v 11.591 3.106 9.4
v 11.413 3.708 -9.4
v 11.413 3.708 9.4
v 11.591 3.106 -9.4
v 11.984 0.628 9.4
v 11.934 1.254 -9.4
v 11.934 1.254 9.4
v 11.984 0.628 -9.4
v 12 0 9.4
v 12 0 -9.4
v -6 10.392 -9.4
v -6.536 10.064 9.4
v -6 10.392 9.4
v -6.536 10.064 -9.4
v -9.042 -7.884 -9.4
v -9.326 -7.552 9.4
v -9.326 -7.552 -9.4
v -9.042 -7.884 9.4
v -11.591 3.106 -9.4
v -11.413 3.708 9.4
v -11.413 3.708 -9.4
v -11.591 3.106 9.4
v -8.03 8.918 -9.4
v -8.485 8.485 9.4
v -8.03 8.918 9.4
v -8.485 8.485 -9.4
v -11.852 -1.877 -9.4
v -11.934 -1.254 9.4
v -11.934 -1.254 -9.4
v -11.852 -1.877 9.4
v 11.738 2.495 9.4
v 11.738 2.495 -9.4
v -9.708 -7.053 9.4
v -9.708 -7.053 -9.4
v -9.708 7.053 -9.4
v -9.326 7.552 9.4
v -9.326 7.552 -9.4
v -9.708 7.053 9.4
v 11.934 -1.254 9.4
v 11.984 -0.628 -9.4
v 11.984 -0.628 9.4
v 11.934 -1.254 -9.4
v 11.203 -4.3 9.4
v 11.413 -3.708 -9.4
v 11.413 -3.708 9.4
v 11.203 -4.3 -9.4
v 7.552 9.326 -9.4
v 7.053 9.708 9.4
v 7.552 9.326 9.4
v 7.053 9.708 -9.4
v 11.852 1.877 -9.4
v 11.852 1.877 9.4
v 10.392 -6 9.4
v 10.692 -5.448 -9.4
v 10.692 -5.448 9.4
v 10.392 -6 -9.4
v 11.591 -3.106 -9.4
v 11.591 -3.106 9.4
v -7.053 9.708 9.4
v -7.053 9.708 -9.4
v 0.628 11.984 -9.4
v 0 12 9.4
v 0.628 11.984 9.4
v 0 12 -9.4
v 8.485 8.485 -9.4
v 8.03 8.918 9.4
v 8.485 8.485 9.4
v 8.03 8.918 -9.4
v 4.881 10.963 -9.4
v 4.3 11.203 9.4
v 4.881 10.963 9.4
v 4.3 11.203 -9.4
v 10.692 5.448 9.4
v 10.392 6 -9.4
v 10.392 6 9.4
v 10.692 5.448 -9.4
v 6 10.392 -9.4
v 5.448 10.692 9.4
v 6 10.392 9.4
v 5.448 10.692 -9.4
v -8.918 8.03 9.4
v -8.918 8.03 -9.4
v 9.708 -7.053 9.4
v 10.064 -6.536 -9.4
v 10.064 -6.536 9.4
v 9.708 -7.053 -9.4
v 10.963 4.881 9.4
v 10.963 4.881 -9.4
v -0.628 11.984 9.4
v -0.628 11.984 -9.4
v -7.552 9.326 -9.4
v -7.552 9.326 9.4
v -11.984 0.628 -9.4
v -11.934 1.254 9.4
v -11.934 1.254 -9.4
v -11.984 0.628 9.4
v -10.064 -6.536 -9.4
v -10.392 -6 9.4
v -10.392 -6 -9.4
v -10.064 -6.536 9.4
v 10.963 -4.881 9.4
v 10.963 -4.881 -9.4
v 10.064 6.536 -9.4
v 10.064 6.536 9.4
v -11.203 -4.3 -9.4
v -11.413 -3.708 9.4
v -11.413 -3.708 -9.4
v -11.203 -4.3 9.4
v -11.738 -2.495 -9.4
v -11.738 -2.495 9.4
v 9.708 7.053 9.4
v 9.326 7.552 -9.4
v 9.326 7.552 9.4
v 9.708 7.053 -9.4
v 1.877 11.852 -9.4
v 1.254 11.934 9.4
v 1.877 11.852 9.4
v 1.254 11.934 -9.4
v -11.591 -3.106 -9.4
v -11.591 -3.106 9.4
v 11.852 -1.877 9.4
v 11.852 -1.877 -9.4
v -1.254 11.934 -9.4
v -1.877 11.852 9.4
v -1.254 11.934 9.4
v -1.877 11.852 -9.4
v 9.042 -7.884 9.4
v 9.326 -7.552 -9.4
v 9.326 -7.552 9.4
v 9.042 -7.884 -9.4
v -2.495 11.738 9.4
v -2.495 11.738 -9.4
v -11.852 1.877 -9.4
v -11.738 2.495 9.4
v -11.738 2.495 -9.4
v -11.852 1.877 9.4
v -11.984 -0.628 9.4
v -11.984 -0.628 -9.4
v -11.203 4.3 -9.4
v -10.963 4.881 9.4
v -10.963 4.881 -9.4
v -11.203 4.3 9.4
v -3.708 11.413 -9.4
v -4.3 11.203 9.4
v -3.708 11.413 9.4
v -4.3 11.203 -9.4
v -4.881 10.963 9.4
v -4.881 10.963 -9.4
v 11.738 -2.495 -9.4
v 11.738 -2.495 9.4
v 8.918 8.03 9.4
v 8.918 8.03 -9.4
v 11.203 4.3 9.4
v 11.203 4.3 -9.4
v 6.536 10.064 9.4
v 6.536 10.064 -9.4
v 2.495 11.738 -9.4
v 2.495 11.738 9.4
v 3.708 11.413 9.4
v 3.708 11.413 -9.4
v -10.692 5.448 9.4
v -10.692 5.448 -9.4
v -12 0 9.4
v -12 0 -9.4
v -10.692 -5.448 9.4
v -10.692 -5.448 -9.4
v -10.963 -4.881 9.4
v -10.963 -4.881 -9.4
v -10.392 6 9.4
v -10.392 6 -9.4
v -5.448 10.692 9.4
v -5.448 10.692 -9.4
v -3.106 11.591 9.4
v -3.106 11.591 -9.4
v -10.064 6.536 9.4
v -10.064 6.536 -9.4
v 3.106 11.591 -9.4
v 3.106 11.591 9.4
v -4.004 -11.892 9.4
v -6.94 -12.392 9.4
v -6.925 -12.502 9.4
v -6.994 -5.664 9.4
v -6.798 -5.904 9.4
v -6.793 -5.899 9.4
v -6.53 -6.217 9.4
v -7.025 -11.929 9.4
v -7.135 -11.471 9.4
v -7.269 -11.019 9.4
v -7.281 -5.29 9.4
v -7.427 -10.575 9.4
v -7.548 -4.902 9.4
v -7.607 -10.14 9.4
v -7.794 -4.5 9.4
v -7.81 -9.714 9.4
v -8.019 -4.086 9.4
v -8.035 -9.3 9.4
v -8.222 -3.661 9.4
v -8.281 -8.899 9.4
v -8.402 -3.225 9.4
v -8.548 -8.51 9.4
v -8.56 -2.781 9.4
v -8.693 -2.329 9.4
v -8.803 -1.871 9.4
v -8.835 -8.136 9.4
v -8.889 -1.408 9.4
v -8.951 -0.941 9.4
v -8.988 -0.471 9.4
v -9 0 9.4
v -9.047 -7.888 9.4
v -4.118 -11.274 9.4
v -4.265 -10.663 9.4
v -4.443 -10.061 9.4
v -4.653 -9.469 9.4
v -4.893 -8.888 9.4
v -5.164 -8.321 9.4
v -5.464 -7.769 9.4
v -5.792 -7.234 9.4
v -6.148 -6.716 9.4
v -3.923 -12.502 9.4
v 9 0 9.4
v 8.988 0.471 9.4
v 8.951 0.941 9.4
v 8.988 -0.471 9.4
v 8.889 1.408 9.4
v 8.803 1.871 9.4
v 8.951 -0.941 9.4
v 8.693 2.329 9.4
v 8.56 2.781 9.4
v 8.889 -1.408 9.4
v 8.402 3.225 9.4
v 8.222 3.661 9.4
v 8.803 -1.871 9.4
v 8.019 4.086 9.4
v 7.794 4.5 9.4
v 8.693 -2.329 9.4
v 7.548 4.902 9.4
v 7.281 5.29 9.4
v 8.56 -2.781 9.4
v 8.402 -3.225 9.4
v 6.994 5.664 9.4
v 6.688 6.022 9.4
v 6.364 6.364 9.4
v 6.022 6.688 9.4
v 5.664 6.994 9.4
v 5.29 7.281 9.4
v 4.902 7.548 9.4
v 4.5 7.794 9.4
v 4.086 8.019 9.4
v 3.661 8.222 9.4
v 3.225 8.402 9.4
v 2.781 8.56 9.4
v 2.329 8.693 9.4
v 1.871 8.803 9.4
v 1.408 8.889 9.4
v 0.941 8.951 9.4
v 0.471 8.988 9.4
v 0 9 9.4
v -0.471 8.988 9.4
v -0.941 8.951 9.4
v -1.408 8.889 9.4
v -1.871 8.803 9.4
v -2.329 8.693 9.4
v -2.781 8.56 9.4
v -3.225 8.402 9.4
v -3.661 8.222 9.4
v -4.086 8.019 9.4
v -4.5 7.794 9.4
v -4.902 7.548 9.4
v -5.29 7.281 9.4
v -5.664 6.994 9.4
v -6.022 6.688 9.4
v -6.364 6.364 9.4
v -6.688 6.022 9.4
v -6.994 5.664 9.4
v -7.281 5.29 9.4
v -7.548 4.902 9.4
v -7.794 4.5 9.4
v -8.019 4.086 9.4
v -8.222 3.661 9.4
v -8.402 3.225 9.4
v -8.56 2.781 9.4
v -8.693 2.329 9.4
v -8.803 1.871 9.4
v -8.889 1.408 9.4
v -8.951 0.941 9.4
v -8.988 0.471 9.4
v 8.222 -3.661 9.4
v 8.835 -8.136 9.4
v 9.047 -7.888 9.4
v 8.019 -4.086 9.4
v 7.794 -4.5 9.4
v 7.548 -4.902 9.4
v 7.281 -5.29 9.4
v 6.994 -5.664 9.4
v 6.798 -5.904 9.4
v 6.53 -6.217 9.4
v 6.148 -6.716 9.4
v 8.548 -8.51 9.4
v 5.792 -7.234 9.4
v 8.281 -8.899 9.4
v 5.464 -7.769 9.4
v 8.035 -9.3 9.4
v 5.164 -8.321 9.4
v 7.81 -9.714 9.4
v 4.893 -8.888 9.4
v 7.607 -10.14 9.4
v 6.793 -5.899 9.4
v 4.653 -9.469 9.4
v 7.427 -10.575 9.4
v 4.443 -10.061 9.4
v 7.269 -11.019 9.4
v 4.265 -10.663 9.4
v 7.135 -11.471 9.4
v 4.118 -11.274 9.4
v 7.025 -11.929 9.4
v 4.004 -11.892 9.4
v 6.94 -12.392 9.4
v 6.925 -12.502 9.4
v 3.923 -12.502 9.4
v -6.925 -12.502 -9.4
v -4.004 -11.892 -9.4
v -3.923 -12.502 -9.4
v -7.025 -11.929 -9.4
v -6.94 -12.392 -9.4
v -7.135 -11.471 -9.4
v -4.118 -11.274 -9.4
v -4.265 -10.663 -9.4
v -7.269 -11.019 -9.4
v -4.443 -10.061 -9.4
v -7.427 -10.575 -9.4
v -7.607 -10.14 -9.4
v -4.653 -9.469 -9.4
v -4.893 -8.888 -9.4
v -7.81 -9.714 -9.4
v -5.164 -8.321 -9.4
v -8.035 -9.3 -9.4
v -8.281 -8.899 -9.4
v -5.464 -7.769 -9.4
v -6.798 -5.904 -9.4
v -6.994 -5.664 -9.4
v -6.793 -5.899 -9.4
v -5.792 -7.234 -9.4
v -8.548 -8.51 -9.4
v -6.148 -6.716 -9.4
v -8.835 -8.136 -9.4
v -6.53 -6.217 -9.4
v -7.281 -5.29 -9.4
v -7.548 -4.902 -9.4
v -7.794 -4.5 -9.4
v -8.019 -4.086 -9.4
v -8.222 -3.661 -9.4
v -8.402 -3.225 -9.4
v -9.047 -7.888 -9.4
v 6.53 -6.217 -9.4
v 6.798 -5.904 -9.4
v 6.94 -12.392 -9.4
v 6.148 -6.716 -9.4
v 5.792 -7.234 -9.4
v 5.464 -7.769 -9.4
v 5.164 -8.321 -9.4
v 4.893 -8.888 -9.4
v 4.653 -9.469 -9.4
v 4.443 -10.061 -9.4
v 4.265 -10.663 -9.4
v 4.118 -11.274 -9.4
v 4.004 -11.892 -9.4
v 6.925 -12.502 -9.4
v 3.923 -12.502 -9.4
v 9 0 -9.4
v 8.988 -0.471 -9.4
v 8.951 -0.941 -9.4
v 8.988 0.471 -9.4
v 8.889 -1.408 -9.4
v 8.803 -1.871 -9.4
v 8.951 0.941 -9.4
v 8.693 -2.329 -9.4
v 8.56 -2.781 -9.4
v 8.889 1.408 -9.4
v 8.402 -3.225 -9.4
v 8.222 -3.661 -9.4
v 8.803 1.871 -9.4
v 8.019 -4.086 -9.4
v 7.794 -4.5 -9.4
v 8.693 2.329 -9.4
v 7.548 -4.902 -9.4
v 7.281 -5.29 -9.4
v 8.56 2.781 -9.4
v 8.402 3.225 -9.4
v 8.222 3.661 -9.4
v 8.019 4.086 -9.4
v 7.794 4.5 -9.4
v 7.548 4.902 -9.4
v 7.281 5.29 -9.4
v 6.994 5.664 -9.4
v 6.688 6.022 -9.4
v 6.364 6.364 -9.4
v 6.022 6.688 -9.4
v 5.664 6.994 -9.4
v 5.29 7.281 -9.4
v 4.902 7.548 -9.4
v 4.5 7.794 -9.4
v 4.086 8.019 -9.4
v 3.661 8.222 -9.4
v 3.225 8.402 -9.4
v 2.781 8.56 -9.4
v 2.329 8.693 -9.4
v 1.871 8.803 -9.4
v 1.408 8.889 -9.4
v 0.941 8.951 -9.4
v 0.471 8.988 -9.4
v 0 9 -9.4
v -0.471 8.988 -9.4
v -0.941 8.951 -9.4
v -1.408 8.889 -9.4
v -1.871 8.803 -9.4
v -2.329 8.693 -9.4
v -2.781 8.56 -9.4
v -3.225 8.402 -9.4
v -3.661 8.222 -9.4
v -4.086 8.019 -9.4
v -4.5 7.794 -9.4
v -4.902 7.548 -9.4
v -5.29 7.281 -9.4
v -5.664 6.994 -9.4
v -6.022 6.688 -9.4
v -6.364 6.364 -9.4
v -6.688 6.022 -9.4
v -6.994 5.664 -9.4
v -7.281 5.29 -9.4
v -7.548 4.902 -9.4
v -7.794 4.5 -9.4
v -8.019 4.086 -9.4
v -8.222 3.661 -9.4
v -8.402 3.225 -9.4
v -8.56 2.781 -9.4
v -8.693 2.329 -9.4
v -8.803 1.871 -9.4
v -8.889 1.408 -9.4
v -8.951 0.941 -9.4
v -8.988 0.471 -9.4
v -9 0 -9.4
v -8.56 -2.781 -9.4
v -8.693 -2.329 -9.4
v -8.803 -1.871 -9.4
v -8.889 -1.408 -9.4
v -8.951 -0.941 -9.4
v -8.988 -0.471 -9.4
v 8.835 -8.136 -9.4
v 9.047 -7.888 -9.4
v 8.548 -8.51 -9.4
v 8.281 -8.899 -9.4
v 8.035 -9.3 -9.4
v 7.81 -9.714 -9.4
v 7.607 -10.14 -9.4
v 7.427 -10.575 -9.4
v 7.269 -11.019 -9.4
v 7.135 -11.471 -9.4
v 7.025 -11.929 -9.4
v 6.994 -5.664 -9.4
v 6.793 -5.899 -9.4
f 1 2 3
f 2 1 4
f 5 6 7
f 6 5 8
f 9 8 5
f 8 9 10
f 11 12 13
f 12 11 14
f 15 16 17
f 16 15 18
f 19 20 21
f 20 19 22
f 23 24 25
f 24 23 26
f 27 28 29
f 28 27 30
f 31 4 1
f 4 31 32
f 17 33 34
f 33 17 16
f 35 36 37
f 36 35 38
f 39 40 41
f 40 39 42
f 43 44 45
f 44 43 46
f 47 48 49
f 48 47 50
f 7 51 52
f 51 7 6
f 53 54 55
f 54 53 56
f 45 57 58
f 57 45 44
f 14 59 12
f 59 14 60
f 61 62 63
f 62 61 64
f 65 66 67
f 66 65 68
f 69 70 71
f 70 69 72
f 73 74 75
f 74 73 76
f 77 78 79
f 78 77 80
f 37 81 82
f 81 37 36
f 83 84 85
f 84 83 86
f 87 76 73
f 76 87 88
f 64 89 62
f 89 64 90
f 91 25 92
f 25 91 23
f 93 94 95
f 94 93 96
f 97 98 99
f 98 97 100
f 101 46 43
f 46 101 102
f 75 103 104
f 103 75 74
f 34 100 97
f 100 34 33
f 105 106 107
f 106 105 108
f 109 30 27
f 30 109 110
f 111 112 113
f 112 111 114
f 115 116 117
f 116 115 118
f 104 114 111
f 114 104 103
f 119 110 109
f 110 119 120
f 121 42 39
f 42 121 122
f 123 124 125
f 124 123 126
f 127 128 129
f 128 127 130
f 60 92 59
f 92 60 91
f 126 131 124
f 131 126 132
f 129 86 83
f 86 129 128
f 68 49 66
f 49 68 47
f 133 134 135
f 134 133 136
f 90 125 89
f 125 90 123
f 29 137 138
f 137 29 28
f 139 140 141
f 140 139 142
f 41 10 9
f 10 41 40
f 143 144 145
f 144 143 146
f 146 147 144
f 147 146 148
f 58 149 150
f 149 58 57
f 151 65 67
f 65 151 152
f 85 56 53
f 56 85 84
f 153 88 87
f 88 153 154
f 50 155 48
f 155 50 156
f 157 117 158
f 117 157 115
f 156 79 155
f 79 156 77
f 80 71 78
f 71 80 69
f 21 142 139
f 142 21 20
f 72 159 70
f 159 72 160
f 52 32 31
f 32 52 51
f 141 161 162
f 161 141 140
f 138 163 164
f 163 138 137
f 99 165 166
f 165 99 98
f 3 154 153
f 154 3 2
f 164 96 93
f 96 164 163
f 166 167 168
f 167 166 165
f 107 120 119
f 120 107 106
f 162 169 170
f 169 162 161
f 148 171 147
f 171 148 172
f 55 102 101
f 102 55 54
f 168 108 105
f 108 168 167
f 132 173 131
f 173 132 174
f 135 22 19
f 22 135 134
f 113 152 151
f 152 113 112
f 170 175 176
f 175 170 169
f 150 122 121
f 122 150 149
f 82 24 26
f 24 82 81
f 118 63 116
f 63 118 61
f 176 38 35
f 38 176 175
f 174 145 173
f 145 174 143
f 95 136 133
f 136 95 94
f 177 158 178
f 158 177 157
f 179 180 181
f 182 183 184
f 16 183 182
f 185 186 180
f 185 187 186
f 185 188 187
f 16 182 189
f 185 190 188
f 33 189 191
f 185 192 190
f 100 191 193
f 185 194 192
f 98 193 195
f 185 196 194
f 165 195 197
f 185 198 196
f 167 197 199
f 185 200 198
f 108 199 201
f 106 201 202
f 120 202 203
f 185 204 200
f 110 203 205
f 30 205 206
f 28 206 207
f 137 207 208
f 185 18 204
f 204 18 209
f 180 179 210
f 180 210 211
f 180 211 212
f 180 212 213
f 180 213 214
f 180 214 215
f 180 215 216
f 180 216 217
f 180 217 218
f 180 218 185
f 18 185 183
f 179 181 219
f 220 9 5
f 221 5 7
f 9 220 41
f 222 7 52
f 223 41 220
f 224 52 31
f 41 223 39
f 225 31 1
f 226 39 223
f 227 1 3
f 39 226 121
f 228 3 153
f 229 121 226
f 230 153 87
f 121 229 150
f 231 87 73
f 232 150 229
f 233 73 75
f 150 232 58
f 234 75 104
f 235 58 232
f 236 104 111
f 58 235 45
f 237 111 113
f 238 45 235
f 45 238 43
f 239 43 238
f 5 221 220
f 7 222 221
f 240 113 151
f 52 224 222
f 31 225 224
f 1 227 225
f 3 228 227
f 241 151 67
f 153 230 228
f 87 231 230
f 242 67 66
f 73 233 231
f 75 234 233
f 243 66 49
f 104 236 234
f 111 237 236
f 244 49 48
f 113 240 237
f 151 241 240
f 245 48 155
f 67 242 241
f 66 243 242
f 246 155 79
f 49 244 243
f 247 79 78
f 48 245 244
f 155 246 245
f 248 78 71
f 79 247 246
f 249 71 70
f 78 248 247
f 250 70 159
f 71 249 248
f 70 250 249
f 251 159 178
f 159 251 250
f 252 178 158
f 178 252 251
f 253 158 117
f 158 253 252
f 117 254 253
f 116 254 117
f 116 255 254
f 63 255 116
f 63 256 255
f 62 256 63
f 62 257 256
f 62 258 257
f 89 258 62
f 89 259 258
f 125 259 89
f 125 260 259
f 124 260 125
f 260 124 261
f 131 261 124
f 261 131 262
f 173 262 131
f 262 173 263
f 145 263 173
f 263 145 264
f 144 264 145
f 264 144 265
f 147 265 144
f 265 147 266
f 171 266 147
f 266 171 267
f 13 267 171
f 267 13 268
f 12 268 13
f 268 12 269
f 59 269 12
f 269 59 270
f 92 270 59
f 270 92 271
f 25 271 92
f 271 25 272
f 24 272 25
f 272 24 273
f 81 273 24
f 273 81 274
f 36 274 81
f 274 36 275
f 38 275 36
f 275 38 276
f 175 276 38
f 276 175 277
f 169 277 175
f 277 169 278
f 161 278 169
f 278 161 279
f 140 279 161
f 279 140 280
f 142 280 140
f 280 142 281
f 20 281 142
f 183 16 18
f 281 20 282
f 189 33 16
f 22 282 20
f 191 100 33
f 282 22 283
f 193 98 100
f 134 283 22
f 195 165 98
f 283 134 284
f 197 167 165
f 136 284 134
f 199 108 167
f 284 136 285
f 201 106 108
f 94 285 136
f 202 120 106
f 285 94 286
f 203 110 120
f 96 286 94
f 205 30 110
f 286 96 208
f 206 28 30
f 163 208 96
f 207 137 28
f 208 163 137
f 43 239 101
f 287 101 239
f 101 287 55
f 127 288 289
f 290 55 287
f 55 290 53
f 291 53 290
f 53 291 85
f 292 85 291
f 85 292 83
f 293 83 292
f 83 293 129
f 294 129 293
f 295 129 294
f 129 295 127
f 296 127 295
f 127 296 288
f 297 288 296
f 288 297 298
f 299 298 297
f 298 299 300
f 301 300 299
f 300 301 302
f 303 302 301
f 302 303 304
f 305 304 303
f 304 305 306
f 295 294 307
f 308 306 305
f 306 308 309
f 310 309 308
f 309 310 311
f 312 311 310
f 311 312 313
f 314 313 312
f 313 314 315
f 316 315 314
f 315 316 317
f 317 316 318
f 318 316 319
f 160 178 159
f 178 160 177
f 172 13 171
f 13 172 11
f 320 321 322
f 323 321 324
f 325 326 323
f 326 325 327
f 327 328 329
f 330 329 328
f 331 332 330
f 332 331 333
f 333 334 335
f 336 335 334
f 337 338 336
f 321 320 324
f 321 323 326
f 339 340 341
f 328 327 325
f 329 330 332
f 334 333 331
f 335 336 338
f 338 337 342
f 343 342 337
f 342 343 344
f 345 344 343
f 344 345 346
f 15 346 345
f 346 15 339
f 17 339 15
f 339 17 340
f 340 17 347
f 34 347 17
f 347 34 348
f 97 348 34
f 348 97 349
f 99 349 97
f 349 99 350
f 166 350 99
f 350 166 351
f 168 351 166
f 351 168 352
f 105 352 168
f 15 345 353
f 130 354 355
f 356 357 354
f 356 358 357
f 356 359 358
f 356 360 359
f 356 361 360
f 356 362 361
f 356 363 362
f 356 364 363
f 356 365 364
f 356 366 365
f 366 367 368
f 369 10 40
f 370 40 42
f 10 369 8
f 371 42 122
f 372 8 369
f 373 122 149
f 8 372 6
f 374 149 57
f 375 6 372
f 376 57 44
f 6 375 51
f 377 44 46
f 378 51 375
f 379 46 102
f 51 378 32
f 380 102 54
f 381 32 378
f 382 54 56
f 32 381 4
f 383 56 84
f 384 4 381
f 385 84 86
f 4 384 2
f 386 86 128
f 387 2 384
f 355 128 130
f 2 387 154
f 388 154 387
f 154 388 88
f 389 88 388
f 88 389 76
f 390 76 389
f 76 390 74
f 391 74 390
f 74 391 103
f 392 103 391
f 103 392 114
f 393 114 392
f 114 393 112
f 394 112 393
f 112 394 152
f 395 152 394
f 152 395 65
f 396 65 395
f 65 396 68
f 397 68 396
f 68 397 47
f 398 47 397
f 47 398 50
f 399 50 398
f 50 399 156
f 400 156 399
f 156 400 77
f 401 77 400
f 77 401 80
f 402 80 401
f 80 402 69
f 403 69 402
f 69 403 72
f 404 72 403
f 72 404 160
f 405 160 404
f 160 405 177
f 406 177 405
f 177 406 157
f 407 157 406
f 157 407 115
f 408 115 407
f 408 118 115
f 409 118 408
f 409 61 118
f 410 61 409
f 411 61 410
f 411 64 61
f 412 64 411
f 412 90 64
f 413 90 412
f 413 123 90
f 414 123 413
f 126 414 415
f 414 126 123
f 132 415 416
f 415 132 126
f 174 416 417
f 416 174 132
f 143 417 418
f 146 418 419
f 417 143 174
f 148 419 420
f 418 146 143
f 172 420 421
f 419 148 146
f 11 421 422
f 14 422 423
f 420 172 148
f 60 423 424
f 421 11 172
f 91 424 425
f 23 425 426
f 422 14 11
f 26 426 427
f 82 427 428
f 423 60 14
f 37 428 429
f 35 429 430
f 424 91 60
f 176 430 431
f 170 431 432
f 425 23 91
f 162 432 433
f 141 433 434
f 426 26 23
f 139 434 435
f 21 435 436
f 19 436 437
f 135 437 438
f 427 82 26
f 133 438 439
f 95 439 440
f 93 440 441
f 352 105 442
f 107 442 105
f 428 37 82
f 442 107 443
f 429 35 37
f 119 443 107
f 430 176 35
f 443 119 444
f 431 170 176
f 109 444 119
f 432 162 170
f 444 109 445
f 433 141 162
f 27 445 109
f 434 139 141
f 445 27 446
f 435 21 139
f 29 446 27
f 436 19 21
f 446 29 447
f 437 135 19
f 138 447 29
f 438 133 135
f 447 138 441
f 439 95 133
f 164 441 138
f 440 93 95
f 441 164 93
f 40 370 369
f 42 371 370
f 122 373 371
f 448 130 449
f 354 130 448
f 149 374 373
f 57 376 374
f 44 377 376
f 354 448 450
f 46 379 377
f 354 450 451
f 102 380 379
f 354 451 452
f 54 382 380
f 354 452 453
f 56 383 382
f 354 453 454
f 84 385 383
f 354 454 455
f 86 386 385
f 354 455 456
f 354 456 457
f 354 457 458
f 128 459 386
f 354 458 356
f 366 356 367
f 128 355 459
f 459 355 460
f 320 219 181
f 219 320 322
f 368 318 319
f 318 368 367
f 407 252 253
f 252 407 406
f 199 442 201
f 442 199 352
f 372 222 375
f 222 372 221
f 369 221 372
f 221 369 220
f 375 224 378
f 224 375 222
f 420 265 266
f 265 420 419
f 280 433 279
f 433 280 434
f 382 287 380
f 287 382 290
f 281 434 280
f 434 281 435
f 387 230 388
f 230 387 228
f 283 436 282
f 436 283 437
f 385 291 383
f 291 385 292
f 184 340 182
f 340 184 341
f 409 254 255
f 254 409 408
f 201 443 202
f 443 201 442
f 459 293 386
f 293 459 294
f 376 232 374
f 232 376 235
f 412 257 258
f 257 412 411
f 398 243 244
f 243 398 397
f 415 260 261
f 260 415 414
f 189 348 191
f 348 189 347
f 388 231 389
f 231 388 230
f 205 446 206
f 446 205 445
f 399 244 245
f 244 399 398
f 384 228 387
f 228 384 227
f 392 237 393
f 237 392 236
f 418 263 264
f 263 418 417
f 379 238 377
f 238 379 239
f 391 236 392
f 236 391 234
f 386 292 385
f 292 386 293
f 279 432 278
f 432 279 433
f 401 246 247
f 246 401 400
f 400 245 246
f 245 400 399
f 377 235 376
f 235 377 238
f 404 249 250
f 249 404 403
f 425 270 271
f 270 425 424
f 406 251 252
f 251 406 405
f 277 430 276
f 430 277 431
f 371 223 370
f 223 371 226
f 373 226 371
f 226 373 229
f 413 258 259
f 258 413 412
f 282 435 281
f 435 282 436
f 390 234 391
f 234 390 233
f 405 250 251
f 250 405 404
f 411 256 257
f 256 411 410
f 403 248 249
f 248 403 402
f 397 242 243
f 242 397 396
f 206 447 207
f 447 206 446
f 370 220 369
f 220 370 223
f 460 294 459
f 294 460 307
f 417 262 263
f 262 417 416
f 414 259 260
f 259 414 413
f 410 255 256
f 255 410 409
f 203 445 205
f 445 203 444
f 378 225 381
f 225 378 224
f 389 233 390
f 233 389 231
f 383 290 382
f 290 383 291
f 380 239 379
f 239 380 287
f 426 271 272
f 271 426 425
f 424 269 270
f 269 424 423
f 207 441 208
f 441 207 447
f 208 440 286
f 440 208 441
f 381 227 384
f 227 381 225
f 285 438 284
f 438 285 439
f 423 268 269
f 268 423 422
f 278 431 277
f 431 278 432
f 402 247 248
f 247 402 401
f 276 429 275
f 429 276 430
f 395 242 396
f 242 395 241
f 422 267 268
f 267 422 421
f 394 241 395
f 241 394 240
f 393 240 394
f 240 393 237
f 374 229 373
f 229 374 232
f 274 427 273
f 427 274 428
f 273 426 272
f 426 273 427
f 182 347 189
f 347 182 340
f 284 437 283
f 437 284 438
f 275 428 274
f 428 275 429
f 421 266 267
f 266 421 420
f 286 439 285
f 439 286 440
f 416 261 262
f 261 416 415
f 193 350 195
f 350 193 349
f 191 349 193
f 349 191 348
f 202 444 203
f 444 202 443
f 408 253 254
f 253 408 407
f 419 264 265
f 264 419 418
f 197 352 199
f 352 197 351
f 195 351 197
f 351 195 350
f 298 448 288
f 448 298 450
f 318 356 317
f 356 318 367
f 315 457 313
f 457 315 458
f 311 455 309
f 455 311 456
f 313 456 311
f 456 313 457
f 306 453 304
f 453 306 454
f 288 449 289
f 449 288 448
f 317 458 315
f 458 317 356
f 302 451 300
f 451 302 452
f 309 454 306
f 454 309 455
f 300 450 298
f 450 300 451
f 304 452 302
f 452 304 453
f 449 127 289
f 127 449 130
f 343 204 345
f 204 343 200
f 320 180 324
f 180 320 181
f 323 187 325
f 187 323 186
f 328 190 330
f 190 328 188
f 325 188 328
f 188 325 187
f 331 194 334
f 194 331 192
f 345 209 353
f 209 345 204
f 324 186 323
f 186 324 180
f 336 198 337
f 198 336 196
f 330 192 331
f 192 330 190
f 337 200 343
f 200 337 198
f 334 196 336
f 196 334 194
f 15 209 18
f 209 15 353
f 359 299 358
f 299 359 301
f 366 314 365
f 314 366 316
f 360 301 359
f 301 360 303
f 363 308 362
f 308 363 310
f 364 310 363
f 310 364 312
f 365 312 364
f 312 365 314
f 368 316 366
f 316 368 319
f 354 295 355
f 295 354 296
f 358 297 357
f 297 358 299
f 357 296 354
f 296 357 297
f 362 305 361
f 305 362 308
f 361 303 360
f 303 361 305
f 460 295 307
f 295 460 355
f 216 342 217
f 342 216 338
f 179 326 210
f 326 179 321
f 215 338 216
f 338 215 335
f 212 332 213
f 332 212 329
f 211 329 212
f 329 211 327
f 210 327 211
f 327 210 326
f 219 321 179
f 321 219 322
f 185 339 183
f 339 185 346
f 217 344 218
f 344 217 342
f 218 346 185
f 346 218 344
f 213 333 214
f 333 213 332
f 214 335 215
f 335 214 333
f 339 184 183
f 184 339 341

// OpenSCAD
// Target Diameter
clamp_target_diameter = 20.0; //[20:0.1:40]
// Closeness
clamp_closeness = 1.0; //[0:0.01:1]
// Thickness
clamp_thickness = 1.0; //[0:0.01:1]
// Width
clamp_width = 1.0; //[0:0.01:1]

///////////////
/* Utilities */
///////////////

function solve_quad_positive(a, b, c) = (- b + sqrt(b * b - 4.0 * a * c)) / (2.0 * a);
function solve_quad_negative(a, b, c) = (- b - sqrt(b * b - 4.0 * a * c)) / (2.0 * a);
function sqr(x) = x * x;
function len(x, y) = sqrt(sqr(x) + sqr(y));

module prism(s, theta1, theta2, h) {
	linear_extrude(height = h, center = true) {
		polygon(points = [[0.0, 0.0], [s * cos(theta1), s * sin(theta1)], [s * cos(theta2), s * sin(theta2)]], paths=[[0, 1, 2]]);
	}
}

module cylindrical_fillet(x, s, r) {
	rot = s ? 0.0 : 180.0;
	translate(x) rotate(rot, [1.0, 0.0, 0.0]) {
		cylinder(r1 = r + 0.90 * r, r2 = r, h = 0.45 * r, center = false);
		cylinder(r1 = r + 0.45 * r, r2 = r, h = 0.90 * r, center = false);
	}
}

module cylinder_with_fillets(x, r, h, tol) {
	translate(x) {
		cylindrical_fillet([0.0, 0.0, - 0.5 * h], true, r + tol * 1.4142 * 0.5);
		cylindrical_fillet([0.0, 0.0, + 0.5 * h], false, r + tol * 1.4142 * 0.5);
		cylinder(r = r + tol, h = h, center = true);
	}
}

//////////////////////
/* Basic parameters */
//////////////////////

x = [clamp_target_diameter, clamp_closeness, clamp_thickness, clamp_width];
inDia = x[0] * 0.9;
opLoc = 0.7 + (x[1] - 0.5) * 0.4;
thick = 1.20 + inDia * 0.10 * (0.2 + x[2] * 0.8);
depth = 8.0 + inDia * (0.1 + x[3] * 0.5);

///////////////
/* Utilities */
///////////////

function f_1(a, b, r1, r2) = - sqr(a) - sqr(b) - 2.0 * r1 * r2 - sqr(r2);
function f_2(a, b) = 4.0 * (sqr(a) + sqr(b));
function f_3(a, c) = 4.0 * a * c;
function f_4(b, c, r1, r2) = sqr(c) - 4.0 * sqr(b) * sqr(r1 + r2);
function solve_tangent_circle_center(p, r1, r2) = solve_quad_positive(f_2(p[0], p[1]), f_3(p[0], f_1(p[0], p[1], r1, r2)), f_4(p[1], f_1(p[0], p[1], r1, r2), r1, r2));

/////////////////////////
/* Internal parameters */
/////////////////////////

t = thick;
l = 0.15 * inDia;
d = depth;
a = 0.5 * inDia * opLoc;
r1 = 0.5 * inDia;
r2 = r1 + t;
y1 = - a;
x1 = sqrt(sqr(r1) - sqr(y1));
x4 = x1 + t;
x3 = x1;
x2 = x4;
y2 = - sqrt(sqr(r2) - sqr(x2));
y4 = y2 - l;
y3 = y4;
x5 = solve_tangent_circle_center([x4, y4], r1, r2);

y5 = - sqrt(sqr(r1 + r2) - sqr(x5));
r4 = len(x5 - x3, y5 - y3);
r3 = r2;
x6 = solve_tangent_circle_center([x3, y3], r3, r1);
y6 = - sqrt(sqr(r3 + r1) - sqr(x6));
r6 = len(x6 - x1, y6 - y1);
theta1 = acos(- x5 / len(x5, y5));
theta2 = acos(- (x5 - x3) / len(x5 - x3, y5 - y3));
theta3 = acos(- x6 / len(x6, y6));
theta4 = acos(- (x6 - x3) / len(x6 - x3, y6 - y3));

///////////
/* Misc. */
///////////

$fn = 120;
e = 0.1;
i = 1000.0;

/////////////
/* Modules */
/////////////

module base() {
  difference() {
    difference() {
      union() {
        cylinder(r = r2, h = d, center = true);
        translate([0.0, 0.5 * y4, 0.0]) cube(size = [x4 * 2.0, - y4, d], center = true);
      }
      cylinder(r = r1, h = d + e, center = true);
    }
    translate([0.0, 0.5 * (y3 - i), 0.0]) cube(size = [x3 * 2.0, - y3 + i, d + e], center = true);
  }
}

module out(s) {
  scale([s, 1.0, 1.0]) {
    intersection() {
      difference() {
        translate([x5, y5, 0.0]) cylinder(r = r4, h = d, center = true);
        translate([x5, y5, 0.0]) cylinder(r = r1, h = d + e, center = true);
      }
      translate([x5, y5, 0.0]) prism(i, theta1, theta2, d);
    }
  }
}

module in(s) {
  scale([s, 1.0, 1.0]) {
    intersection() {
      difference() {
        translate([x6, y6, 0.0]) cylinder(r = r6 + e, h = d + e, center = true);
        translate([x6, y6, 0.0]) cylinder(r = r3, h = d + 2.0 * e, center = true);
      }
      translate([x6, y6, 0.0]) prism(i, theta3, theta4, d + e);
    }
  }
}

module snap_pipe_clamp() {
  difference() {
    union() {
      base();
      out(1.0);
      out(-1.0);
    }
    union() {
      in(1.0);
      in(-1.0);
      translate([0.0, y4 - i / 2.0, 0.0]) cube(size = [i, i, d + e], center = true);
    }
  }
}

snap_pipe_clamp();
